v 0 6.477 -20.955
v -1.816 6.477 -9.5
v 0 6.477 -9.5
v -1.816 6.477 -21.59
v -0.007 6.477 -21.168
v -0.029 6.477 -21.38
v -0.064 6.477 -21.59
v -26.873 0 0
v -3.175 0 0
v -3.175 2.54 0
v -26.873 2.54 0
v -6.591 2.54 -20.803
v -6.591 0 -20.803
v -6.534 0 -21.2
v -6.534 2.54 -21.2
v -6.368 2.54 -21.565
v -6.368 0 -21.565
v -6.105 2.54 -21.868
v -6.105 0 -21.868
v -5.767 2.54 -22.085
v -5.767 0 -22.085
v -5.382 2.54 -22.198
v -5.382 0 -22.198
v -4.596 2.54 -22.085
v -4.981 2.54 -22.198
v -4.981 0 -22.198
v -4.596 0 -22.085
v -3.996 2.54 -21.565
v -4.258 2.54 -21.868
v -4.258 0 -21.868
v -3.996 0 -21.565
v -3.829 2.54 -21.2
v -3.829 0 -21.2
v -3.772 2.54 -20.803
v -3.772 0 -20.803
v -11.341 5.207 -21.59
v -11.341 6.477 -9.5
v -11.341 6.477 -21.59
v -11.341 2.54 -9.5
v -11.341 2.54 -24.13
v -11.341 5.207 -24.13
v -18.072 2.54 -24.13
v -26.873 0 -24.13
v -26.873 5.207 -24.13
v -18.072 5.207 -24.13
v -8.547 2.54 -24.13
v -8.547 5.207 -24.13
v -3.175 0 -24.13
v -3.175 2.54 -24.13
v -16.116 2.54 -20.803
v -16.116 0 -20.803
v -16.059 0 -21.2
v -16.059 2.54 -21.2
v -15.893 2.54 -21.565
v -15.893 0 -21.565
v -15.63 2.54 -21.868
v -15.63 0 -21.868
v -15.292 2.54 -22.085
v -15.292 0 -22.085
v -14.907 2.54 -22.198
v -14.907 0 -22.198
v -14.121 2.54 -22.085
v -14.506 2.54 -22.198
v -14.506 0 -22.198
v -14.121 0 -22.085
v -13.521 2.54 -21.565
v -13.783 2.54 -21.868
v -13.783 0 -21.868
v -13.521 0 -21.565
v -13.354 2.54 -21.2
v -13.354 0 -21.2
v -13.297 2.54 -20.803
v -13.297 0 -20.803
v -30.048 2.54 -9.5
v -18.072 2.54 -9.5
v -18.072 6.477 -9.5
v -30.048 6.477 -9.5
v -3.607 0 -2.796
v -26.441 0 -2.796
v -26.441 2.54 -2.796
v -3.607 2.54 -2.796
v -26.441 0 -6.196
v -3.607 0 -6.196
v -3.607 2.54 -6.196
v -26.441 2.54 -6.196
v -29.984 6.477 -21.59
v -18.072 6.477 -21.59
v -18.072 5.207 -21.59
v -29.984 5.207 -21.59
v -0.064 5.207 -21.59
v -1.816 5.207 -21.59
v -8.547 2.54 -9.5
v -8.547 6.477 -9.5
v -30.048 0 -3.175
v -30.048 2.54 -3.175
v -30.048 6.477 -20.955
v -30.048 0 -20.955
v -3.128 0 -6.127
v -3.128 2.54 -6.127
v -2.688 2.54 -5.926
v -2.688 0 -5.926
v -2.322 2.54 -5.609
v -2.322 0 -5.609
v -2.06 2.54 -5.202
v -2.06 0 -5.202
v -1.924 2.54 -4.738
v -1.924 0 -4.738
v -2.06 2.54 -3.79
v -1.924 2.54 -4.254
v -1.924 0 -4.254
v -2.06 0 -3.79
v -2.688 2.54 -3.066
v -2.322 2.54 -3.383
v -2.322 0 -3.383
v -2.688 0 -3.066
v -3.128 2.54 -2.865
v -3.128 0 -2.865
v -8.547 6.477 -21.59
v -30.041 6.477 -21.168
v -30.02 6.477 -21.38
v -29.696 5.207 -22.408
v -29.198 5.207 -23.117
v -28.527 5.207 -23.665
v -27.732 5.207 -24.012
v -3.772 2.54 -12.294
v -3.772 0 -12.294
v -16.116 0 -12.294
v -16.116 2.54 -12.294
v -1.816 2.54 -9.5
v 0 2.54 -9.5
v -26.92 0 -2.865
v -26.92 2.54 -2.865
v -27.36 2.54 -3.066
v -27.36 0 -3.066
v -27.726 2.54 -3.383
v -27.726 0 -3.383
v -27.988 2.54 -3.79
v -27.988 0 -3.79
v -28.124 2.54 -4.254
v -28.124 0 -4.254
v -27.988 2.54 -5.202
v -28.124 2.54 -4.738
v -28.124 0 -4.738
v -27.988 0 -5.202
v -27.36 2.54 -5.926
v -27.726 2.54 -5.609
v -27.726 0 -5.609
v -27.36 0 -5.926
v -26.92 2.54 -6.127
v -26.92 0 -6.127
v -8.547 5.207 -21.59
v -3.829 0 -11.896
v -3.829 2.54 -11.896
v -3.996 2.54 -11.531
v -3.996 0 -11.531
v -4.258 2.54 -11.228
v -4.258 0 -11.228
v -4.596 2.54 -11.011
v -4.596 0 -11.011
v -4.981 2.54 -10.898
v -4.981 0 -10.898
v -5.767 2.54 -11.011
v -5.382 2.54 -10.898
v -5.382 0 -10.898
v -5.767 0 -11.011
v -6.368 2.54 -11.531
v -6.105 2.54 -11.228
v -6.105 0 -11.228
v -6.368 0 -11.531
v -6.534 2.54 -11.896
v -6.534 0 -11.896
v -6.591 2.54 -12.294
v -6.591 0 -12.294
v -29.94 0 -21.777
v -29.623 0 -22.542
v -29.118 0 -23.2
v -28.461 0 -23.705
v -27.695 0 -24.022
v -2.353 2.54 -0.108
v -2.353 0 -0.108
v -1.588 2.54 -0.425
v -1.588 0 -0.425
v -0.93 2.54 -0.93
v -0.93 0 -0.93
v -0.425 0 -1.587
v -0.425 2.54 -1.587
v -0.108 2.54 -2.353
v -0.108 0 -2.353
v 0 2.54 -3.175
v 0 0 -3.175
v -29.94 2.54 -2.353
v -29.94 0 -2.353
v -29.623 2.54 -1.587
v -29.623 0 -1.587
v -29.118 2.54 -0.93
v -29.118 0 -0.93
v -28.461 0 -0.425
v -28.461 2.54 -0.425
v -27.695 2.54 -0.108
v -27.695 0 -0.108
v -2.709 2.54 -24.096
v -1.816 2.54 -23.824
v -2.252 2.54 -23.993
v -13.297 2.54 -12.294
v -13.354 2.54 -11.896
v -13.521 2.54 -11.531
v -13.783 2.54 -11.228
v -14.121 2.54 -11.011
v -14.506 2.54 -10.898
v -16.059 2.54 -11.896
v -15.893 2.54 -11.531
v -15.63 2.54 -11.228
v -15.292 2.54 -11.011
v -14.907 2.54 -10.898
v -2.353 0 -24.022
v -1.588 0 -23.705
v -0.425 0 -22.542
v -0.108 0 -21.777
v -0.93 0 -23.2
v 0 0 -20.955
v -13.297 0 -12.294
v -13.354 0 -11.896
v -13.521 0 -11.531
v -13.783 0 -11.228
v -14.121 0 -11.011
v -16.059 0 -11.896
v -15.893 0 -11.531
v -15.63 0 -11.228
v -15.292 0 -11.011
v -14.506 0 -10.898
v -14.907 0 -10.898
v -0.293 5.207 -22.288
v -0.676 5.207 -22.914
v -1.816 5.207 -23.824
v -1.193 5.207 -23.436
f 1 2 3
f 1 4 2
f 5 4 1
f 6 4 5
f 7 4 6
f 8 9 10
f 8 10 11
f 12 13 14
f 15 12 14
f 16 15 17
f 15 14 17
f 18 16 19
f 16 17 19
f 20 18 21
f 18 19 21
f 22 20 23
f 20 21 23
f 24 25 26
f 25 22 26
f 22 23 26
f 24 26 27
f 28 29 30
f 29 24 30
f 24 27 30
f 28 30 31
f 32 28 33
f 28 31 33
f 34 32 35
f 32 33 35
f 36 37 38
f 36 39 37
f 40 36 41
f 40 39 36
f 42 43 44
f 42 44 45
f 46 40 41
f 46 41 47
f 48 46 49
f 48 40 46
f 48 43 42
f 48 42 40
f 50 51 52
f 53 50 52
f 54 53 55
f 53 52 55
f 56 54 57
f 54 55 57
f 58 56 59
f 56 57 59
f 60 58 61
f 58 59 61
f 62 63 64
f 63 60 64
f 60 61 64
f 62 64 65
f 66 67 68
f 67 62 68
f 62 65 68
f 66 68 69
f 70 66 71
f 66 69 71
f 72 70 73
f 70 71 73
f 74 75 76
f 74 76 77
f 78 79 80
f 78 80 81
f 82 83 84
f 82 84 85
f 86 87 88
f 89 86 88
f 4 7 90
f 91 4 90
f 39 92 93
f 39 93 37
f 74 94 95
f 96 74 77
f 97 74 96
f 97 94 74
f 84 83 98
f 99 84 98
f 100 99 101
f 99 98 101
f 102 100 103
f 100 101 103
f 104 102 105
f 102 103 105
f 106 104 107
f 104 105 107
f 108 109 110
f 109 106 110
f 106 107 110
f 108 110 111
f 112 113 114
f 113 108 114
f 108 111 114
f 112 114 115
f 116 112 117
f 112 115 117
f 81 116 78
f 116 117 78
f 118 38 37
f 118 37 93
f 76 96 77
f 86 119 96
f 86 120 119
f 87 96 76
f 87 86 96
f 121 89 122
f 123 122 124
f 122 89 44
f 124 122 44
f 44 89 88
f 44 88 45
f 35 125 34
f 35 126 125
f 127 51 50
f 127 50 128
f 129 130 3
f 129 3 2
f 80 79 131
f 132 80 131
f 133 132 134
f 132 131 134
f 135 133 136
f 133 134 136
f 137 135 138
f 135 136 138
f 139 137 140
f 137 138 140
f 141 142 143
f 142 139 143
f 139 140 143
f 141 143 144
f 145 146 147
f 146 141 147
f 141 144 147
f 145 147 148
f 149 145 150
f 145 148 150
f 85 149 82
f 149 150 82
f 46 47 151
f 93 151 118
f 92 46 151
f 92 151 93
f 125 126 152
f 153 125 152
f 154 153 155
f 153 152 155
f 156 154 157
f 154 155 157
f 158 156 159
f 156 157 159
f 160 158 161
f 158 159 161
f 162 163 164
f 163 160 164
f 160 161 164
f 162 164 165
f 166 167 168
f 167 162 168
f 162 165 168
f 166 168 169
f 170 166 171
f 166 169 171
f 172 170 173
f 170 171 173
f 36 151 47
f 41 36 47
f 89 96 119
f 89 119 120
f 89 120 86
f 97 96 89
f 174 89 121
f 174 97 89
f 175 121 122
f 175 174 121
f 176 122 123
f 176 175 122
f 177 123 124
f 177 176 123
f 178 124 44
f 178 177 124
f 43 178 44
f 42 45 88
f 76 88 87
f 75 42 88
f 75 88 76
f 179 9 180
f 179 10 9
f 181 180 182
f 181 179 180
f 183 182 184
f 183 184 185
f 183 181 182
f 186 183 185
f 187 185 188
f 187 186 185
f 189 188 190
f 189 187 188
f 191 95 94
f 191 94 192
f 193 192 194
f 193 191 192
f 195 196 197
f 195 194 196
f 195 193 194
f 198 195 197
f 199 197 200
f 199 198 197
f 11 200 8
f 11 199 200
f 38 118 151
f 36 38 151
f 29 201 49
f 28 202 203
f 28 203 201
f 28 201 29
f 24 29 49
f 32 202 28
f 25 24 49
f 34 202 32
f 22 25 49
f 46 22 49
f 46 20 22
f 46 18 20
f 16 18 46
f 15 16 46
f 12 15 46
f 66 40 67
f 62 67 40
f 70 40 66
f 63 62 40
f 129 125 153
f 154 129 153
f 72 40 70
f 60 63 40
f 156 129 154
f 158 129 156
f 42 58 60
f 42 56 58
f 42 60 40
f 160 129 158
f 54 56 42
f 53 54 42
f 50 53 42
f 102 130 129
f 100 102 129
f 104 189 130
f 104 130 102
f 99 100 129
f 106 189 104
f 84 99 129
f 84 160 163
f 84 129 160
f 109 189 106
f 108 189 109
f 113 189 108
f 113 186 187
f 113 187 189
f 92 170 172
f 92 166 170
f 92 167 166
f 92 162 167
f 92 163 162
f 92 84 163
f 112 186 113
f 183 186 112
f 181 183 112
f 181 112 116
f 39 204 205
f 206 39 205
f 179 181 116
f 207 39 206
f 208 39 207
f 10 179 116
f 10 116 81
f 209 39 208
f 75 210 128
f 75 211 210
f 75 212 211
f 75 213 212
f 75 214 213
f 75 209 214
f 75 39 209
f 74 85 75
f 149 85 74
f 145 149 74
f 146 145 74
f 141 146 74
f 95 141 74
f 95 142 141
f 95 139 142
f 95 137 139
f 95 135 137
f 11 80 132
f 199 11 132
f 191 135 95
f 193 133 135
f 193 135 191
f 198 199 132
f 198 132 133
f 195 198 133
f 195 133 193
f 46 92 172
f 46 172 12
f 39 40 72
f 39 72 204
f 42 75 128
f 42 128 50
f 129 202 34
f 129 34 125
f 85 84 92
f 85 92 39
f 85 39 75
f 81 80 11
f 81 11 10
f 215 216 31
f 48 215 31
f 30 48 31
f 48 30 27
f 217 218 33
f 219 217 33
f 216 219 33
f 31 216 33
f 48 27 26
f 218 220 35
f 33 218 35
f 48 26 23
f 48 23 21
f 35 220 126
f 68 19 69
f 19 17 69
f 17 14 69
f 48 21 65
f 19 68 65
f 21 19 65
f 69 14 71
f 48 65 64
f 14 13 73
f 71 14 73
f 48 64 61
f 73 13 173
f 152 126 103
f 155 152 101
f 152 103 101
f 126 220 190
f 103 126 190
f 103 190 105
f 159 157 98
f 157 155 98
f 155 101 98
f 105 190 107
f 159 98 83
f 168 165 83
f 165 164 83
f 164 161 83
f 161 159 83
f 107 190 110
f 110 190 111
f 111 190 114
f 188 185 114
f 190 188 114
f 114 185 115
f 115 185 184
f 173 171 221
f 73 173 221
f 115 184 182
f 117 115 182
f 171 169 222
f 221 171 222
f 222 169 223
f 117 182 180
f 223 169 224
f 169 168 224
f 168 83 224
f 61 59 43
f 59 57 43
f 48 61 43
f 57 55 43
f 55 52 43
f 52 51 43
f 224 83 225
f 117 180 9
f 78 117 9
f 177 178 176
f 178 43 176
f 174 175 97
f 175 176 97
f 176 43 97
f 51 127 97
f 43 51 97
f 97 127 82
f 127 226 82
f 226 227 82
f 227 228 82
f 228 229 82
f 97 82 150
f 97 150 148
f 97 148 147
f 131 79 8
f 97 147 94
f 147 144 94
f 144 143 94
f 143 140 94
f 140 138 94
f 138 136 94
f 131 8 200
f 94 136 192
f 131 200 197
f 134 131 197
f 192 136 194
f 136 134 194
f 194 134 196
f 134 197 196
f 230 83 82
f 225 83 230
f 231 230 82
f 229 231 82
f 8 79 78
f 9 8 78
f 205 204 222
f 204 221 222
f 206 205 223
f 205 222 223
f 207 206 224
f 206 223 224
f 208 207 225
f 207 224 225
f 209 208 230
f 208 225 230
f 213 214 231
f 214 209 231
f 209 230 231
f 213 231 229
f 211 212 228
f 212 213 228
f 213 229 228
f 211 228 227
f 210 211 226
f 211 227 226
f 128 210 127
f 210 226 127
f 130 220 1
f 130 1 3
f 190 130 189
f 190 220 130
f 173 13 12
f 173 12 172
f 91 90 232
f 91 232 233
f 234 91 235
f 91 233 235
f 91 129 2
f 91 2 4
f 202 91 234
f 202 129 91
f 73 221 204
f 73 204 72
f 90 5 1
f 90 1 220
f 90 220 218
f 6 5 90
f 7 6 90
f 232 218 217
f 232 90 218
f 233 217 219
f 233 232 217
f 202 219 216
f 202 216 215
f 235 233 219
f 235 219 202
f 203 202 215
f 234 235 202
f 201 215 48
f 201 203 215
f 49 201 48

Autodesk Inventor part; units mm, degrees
ref_plane "YZ Plane" through (0, 0, 0) normal (1, 0, 0) x (0, 1, 0)
sketch "Sketch1" plane through (0, 0, 0) normal (0, 1, 0) x (-1, 0, 0)
  line L0 (0, 0) -> (30.0482, 0)
  line L1 (30.0482, 0) -> (30.0482, -24.13)
  line L2 (30.0482, -24.13) -> (0, -24.13)
  line L3 (0, -24.13) -> (0, 0)
  line L4 (5.1816, -12.2936) -> (5.1816, -20.8026) construction
  line L5 (3.7719, -12.2936) -> (3.7719, -20.8026)
  line L6 (6.5913, -20.8026) -> (6.5913, -12.2936)
  arc A0 (6.5913, -12.2936) -> (3.7719, -12.2936) centre (5.1816, -12.2936) ccw
  arc A1 (3.7719, -20.8026) -> (6.5913, -20.8026) centre (5.1816, -20.8026) ccw
  line L7 (14.7066, -12.2936) -> (14.7066, -20.8026) construction
  line L8 (13.2969, -12.2936) -> (13.2969, -20.8026)
  line L9 (16.1163, -20.8026) -> (16.1163, -12.2936)
  arc A2 (16.1163, -12.2936) -> (13.2969, -12.2936) centre (14.7066, -12.2936) ccw
  arc A3 (13.2969, -20.8026) -> (16.1163, -20.8026) centre (14.7066, -20.8026) ccw
  line L10 (26.4414, -4.4958) -> (3.6068, -4.4958) construction
  line L11 (26.4414, -2.7958) -> (3.6068, -2.7958)
  line L12 (3.6068, -6.1958) -> (26.4414, -6.1958)
  arc A4 (26.4414, -6.1958) -> (26.4414, -2.7958) centre (26.4414, -4.4958) ccw
  arc A5 (3.6068, -2.7958) -> (3.6068, -6.1958) centre (3.6068, -4.4958) ccw
  point P0 (5.1816, -16.5481)
  point P1 (14.7066, -16.5481)
  point P2 (15.0241, -4.4958)
  dimension "d0" = 30.0482
  dimension "d1" = 24.13
  dimension "d5" = 12.2936
  dimension "d6" = 2.8194
  dimension "d7" = 5.1816
  dimension "d8" = 3.3274
  dimension "d11" = 9.525
  dimension "d16" = 3.4
  dimension "d17" = 4.4958
  dimension "d18" = 3.6068
  dimension "d19" = 3.6068
extrude "Extrusion1" add sketch "Sketch1" along normal blind 2.54
sketch "Sketch2" plane through (0, 2.54, 0) normal (0, 1, 0) x (1, 0, 0)
  line L0 (0, 24.13) -> (-30.0482, 24.13) projected
  line L1 (0, 0) -> (0, 24.13) projected
  line L2 (-30.0482, 24.13) -> (0, 24.13)
  line L3 (0, 24.13) -> (0, 9.5)
  line L4 (0, 9.5) -> (-30.0482, 9.5)
  line L5 (-30.0482, 9.5) -> (-30.0482, 24.13)
  line L6 (-30.0482, 0) -> (0, 0) projected
  line L7 (-1.8161, 9.5) -> (-1.8161, 24.13)
  line L8 (-1.8161, 24.13) -> (-8.5471, 24.13)
  line L9 (-8.5471, 24.13) -> (-8.5471, 9.5)
  arc A0 (-6.5913, 12.2936) -> (-3.7719, 12.2936) centre (-5.1816, 12.2936) ccw projected
  line L10 (-8.5471, 0.4572) -> (-1.8161, 24.13) construction
  line L11 (-1.8161, 0.4572) -> (-8.5471, 24.13) construction
  line L12 (-8.5471, 9.5) -> (-1.5875, 9.5)
  line L13 (-18.0721, 24.13) -> (-18.0721, 9.5)
  line L14 (-11.3411, 9.5) -> (-11.3411, 24.13)
  line L15 (-18.0721, 9.5) -> (-11.1125, 9.5)
  line L16 (-11.3411, 24.13) -> (-18.0721, 24.13)
  point P0 (-8.5471, 9.5)
  point P1 (-18.0721, 9.5)
  dimension "d22" = 9.5
  dimension "d23" = 6.731
  dimension "d24" = 3.3655
  dimension "d27" = 9.525
extrude "Extrusion2" add sketch "Sketch2" along normal blind 3.937 contours L1 L4 L7 L0 | L9 L4 L14 L0 | L13 L4 L5 L0
ref_plane "Work Plane1" through (-5.1816, 0, -12.2936) normal (1, 0, 0) x (0, 0, -1)
ref_plane "Work Plane2" through (-14.7066, 0, -12.2936) normal (1, 0, 0) x (0, 0, -1)
sketch "Sketch3" plane through (0, 0, 0) normal (1, 0, 0) x (0, 0, -1)
  line L0 (24.13, 6.477) -> (9.5, 6.477) projected
  line L1 (24.13, 6.477) -> (21.59, 6.477)
  line L2 (21.59, 6.477) -> (21.59, 5.207)
  line L3 (21.59, 5.207) -> (24.13, 5.207)
  line L4 (24.13, 5.207) -> (24.13, 6.477)
  point P0 (0, 0)
  dimension "d35" = 2.54
  dimension "d36" = 1.27
extrude "Extrusion3" cut sketch "Sketch3" against normal through all
fillet "Fillet2" radius 3.175 4 edges at (0, 1.27, 0) (0, 2.6035, -24.13) (-30.0482, 2.6035, -24.13) (-30.0482, 1.27, 0)
equation "\"d19\" = d18"
equation "\"d27\" = d11"
properties part number "Limit switch mount top nut well"
